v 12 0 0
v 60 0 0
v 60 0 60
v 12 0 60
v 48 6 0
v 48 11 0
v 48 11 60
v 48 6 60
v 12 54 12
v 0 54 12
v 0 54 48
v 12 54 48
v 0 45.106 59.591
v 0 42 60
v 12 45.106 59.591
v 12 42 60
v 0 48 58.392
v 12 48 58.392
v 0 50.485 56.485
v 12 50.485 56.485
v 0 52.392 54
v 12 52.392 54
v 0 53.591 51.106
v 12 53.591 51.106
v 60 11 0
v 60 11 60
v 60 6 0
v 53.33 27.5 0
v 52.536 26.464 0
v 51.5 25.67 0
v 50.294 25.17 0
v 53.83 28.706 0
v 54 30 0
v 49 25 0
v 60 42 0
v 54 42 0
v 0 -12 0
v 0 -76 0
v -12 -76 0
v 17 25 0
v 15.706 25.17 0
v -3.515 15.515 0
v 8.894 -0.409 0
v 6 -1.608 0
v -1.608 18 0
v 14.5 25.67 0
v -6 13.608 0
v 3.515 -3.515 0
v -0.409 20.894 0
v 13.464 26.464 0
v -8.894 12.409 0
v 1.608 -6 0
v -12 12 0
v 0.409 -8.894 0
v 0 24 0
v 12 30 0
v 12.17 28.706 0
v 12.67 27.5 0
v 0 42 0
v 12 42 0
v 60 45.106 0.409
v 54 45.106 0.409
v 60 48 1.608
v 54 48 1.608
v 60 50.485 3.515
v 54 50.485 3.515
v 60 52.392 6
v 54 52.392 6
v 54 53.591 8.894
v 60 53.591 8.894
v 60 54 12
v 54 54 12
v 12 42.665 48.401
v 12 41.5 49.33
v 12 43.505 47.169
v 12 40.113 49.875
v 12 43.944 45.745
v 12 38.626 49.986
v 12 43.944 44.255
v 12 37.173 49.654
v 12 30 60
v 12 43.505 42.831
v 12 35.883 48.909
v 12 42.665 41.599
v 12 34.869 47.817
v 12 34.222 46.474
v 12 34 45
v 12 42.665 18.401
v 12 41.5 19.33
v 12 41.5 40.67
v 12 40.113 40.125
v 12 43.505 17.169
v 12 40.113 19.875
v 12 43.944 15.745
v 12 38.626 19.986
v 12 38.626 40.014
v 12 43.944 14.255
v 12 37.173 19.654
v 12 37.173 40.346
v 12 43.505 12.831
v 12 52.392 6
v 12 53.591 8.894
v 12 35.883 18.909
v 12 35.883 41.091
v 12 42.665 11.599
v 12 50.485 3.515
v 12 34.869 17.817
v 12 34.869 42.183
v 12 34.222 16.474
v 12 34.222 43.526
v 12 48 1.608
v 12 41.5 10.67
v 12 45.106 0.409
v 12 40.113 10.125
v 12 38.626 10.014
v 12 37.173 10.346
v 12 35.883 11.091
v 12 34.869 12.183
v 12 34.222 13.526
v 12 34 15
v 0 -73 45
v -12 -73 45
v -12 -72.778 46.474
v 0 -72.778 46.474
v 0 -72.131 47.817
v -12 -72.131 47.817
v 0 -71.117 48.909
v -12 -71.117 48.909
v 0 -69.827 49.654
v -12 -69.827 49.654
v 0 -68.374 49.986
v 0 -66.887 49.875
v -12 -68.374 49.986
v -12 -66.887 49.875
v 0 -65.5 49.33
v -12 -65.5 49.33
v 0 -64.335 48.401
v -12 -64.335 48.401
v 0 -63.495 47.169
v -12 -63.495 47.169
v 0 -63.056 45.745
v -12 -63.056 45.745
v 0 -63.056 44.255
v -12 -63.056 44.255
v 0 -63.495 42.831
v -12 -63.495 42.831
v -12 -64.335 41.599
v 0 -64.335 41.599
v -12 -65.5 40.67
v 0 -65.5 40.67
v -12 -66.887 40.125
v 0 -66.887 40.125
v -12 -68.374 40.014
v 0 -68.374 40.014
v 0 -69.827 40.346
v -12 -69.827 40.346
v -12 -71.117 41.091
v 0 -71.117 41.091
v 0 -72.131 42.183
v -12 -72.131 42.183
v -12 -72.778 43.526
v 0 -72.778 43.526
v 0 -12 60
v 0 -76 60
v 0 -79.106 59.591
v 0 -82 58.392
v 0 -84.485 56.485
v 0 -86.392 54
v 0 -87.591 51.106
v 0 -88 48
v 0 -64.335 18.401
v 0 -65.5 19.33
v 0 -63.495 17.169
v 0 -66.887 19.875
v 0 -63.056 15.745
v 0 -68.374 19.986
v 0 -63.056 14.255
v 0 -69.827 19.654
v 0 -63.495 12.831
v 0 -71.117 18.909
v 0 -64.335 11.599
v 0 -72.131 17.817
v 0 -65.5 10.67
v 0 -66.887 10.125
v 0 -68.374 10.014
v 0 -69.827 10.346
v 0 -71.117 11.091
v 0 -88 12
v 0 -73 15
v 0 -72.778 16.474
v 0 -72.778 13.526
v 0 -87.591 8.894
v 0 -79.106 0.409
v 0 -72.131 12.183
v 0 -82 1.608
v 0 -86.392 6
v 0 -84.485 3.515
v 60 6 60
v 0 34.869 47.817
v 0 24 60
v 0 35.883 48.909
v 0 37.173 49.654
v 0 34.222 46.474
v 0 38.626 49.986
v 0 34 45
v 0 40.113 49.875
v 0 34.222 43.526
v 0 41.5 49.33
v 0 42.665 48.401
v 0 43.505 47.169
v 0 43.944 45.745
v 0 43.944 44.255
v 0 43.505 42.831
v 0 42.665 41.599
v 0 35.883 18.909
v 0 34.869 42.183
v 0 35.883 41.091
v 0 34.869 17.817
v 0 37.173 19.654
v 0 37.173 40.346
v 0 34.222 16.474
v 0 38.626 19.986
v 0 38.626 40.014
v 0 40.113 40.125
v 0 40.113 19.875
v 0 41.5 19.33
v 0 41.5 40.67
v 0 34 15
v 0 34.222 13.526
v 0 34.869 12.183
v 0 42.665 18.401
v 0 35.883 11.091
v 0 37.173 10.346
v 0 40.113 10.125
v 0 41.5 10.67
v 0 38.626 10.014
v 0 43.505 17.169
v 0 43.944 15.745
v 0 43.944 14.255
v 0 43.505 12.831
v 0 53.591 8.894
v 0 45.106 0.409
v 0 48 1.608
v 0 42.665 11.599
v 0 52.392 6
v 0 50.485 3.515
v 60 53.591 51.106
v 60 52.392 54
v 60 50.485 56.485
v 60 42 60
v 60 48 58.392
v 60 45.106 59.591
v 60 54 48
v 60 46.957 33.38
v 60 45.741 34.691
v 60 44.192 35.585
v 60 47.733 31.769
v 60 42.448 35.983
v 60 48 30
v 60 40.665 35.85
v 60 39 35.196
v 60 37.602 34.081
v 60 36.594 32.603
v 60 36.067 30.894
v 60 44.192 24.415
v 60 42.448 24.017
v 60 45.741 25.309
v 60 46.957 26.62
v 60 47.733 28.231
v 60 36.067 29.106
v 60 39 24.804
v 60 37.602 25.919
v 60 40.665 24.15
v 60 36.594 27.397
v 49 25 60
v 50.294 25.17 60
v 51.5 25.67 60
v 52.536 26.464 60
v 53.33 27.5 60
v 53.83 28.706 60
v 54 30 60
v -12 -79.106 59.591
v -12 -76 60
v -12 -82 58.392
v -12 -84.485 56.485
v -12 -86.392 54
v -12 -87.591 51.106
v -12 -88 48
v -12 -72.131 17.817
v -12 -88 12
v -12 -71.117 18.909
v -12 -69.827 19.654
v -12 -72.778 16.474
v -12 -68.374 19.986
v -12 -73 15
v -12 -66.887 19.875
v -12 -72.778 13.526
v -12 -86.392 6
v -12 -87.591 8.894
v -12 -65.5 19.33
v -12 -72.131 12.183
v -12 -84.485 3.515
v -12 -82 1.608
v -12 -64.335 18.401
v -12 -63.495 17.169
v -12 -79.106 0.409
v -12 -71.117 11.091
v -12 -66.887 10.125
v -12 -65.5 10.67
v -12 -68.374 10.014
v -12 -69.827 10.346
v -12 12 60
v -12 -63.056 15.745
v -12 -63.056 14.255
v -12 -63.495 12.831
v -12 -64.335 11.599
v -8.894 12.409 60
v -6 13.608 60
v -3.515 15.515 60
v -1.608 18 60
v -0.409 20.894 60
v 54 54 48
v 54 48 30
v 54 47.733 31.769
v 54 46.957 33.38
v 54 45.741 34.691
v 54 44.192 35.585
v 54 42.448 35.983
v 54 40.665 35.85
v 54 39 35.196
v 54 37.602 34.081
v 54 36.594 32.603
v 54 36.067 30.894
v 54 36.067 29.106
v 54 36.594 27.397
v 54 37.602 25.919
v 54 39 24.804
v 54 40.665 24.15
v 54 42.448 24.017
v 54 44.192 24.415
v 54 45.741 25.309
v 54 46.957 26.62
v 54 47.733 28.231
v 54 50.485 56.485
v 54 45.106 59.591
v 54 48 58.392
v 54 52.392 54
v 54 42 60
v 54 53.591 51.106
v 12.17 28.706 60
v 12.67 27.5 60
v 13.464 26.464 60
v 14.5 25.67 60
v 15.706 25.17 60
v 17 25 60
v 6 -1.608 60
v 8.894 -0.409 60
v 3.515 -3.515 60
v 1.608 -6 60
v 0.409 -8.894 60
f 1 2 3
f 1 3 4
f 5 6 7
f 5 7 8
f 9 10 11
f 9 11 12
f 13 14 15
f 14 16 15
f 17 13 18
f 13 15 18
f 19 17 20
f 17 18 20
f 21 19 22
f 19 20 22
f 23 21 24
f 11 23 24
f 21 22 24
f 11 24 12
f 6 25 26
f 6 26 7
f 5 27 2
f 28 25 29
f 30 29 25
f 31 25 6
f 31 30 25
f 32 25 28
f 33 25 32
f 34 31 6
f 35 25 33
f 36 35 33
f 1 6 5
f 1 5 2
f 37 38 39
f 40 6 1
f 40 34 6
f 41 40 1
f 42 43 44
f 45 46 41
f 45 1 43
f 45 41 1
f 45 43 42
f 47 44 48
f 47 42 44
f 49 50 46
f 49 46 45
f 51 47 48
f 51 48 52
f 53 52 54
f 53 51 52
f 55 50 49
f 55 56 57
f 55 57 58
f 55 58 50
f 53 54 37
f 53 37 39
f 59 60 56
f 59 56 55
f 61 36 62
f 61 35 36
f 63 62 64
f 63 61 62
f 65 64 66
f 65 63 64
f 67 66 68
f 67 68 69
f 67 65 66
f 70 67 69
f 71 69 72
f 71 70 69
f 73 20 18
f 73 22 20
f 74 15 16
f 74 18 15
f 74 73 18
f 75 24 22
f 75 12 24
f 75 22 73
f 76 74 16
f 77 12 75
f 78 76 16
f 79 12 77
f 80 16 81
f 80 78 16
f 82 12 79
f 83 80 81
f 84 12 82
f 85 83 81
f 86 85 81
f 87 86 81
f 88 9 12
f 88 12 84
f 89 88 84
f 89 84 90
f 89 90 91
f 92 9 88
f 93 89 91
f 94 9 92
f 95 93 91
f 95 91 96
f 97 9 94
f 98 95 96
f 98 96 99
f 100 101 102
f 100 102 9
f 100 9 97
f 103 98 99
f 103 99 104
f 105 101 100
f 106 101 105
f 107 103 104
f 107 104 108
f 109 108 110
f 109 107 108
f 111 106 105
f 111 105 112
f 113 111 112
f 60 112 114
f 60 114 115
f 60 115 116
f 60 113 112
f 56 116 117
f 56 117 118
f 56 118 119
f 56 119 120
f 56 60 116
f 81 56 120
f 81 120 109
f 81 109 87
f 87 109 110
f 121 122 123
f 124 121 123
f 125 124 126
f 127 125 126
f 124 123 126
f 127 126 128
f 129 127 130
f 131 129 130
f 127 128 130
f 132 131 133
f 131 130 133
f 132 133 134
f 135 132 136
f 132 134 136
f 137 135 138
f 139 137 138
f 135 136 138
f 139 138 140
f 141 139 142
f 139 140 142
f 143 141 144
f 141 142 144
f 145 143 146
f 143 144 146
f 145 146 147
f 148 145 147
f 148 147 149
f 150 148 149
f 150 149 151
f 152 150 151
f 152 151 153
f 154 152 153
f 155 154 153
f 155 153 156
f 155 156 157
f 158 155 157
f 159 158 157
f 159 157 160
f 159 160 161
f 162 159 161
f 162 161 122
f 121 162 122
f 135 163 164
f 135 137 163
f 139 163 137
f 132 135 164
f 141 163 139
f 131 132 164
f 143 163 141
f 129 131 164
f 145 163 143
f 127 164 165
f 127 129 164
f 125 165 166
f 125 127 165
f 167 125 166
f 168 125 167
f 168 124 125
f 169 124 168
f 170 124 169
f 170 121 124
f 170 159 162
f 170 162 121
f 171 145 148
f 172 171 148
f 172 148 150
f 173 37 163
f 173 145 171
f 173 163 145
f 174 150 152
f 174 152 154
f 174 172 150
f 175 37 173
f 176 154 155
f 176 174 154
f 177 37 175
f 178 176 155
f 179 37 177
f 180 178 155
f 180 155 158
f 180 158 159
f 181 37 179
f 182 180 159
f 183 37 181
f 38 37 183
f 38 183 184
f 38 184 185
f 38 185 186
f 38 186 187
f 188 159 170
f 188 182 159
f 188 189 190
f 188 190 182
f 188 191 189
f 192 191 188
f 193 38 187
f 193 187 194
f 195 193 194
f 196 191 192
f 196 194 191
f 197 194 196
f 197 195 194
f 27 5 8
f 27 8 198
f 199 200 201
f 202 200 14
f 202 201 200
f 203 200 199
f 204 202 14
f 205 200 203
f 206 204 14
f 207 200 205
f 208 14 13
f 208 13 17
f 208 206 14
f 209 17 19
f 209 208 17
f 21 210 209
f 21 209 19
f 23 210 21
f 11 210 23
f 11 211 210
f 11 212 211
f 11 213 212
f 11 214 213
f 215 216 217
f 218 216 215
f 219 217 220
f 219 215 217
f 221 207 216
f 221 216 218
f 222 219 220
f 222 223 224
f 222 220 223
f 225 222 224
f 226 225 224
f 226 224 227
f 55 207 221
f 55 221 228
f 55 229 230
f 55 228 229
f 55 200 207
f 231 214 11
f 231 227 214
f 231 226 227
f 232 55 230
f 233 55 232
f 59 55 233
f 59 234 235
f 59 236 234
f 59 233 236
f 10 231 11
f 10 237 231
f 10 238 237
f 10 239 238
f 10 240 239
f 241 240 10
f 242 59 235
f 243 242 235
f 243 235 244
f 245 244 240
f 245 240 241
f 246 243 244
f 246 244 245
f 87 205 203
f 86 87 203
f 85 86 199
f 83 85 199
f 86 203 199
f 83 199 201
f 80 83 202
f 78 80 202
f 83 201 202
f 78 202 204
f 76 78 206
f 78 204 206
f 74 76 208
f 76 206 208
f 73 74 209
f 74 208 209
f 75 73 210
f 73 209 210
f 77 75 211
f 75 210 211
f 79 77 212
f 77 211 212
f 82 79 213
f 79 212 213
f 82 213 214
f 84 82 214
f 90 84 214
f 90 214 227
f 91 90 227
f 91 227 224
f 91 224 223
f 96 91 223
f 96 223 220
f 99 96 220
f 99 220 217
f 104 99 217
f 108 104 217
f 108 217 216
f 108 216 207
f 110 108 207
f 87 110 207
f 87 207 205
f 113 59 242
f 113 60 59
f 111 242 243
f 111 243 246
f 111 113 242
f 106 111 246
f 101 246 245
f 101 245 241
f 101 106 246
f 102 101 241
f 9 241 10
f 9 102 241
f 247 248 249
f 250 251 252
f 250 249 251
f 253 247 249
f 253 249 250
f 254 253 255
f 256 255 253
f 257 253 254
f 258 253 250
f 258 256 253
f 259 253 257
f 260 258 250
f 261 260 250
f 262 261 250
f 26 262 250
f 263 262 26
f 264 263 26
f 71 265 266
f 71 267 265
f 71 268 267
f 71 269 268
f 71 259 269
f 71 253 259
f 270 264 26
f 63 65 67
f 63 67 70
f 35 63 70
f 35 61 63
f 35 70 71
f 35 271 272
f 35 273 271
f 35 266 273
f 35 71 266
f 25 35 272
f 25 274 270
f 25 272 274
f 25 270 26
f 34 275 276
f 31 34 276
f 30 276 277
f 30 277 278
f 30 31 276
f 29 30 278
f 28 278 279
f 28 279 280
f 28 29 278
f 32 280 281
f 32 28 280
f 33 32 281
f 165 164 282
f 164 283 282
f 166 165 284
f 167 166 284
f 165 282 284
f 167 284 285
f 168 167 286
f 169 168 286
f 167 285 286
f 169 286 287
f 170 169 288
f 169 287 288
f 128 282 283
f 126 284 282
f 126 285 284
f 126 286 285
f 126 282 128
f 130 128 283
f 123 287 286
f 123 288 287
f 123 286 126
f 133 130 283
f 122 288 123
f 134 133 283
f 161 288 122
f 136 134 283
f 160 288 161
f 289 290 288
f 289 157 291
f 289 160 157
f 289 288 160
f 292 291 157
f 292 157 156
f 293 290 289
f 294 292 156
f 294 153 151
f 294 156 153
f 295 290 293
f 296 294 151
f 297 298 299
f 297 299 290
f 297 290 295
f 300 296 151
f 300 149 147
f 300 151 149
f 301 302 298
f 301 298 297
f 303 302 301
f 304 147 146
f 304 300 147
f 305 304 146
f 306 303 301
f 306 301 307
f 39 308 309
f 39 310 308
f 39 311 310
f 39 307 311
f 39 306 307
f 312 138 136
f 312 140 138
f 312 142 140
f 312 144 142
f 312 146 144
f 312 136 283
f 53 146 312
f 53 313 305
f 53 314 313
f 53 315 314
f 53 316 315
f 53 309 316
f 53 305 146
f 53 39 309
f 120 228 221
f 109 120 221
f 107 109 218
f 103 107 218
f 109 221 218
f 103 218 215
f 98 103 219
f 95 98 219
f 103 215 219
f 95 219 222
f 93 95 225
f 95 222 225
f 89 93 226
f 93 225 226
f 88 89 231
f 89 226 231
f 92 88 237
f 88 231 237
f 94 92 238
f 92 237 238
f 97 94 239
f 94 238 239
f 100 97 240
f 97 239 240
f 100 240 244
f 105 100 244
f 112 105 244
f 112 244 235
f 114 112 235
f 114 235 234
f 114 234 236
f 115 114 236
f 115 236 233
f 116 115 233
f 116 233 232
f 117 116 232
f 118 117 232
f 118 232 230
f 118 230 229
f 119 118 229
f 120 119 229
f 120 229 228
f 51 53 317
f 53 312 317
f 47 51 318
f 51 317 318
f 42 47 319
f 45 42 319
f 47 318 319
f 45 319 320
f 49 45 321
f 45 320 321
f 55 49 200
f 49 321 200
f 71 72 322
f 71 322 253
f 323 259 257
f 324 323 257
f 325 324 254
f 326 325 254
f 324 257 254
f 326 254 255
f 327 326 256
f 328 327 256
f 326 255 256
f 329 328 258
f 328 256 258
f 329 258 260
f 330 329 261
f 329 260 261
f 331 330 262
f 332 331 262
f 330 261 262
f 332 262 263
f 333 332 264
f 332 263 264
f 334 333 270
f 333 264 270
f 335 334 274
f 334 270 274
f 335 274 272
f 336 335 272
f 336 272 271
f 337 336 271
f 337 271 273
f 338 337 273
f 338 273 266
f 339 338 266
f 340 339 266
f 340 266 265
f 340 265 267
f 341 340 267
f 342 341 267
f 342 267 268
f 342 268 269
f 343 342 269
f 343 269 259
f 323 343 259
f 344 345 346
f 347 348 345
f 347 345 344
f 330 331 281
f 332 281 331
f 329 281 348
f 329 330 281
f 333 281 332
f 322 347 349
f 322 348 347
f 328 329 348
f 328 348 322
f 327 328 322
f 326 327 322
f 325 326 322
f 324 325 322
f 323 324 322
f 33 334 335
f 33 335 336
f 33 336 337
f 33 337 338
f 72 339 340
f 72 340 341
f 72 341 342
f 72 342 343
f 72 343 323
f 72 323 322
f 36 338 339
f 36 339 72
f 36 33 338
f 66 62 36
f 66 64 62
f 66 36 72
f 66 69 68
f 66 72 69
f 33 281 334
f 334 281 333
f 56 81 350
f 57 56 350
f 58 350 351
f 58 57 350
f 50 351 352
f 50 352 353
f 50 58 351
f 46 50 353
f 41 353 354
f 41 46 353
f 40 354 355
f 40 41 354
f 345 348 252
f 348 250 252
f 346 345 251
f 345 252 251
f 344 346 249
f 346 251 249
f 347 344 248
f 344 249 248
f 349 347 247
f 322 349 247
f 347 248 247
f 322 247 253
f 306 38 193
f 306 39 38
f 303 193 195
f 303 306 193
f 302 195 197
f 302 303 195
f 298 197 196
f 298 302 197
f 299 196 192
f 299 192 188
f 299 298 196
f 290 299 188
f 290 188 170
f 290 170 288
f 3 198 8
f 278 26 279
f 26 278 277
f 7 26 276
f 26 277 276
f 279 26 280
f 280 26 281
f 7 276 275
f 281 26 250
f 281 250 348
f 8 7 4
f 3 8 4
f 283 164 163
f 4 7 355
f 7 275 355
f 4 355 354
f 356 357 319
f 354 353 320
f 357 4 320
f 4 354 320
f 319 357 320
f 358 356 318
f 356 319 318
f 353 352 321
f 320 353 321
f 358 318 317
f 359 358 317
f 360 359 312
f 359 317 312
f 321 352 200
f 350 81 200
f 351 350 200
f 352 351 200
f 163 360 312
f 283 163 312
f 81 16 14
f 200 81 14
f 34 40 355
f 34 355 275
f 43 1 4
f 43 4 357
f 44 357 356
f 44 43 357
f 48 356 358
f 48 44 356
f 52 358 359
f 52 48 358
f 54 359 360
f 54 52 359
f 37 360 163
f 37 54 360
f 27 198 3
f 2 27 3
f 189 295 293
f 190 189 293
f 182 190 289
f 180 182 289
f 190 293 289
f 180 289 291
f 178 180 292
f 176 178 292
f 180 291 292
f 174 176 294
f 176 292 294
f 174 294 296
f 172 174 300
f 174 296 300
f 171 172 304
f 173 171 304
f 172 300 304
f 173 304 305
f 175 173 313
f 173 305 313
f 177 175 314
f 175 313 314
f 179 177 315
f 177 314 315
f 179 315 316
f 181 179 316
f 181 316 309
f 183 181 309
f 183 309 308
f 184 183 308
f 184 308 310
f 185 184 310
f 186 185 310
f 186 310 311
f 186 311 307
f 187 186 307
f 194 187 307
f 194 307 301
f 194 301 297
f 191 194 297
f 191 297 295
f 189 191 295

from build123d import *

# Parameters (mm, degrees)
BOSS_EXTRUDE1_DEPTH = 60
FILLET1_R           = 12
FILLET2_R           = 12
CUT_EXTRUDE1_REACH  = 130.561
SKETCH4_R           = 5
CUT_EXTRUDE2_REACH  = 130.561
SKETCH5_R           = 6


with BuildPart() as part:
    # Sketch2 → Boss-Extrude1 (new body)
    with BuildSketch(Plane.XY):
        with BuildLine():
            Line((0, -12), (0, -88))
            Line((0, -88), (-12, -88))
            Line((-12, -88), (-12, 12))
            Line((-12, 12), (0, 12))
            Line((0, 12), (0, 54))
            Line((0, 54), (12, 54))
            Line((12, 54), (12, 30))
            ThreePointArc((12, 30), (13.464466094, 26.464466094), (17, 25))
            Line((17, 25), (49, 25))
            ThreePointArc((49, 25), (52.535533906, 26.464466094), (54, 30))
            Line((54, 30), (54, 54))
            Line((54, 54), (60, 54))
            Line((60, 54), (60, 11))
            Line((60, 11), (48, 11))
            Line((48, 11), (48, 6))
            Line((48, 6), (60, 6))
            Line((60, 6), (60, 0))
            Line((60, 0), (12, 0))
            ThreePointArc((12, 0), (3.514718626, -3.514718626), (0, -12))
        make_face()
    extrude(amount=BOSS_EXTRUDE1_DEPTH)

    # Fillet1
    fillet1_edges = [part.edges().sort_by_distance(p)[0] for p in [
        (0, 12, 30),
    ]]
    fillet(fillet1_edges, radius=FILLET1_R - 0.0001)  # a hair under: the kernel refuses the full size

    # Fillet2
    fillet2_edges = [part.edges().sort_by_distance(p)[0] for p in [
        (6, 54, 0),
        (57, 54, 0),
        (-6, -88, 0),
        (57, 54, 60),
        (-6, -88, 60),
        (6, 54, 60),
    ]]
    fillet(fillet2_edges, radius=FILLET2_R)

    # Sketch4 → Cut-Extrude1 (cut, up to next)
    with BuildSketch(Plane.ZY.offset(12), mode=Mode.PRIVATE) as cut_extrude1_sk1:
        with Locations(Location((15, -68, 0), (0, 0, 270))):
            Circle(SKETCH4_R)
    cut_extrude1_tool1 = extrude(cut_extrude1_sk1.sketch, amount=-CUT_EXTRUDE1_REACH, mode=Mode.PRIVATE) & part.part
    # Sketch4 → Cut-Extrude1 (cut, up to next)
    with BuildSketch(Plane.ZY.offset(12), mode=Mode.PRIVATE) as cut_extrude1_sk2:
        with Locations(Location((45, -68, 0), (0, 0, 270))):
            Circle(SKETCH4_R)
    cut_extrude1_tool2 = extrude(cut_extrude1_sk2.sketch, amount=-CUT_EXTRUDE1_REACH, mode=Mode.PRIVATE) & part.part
    # Sketch4 → Cut-Extrude1 (cut, up to next)
    with BuildSketch(Plane.ZY.offset(12), mode=Mode.PRIVATE) as cut_extrude1_sk3:
        with Locations(Location((15, 39, 0), (0, 0, 270))):
            Circle(SKETCH4_R)
    cut_extrude1_tool3 = extrude(cut_extrude1_sk3.sketch, amount=-CUT_EXTRUDE1_REACH, mode=Mode.PRIVATE) & part.part
    # Sketch4 → Cut-Extrude1 (cut, up to next)
    with BuildSketch(Plane.ZY.offset(12), mode=Mode.PRIVATE) as cut_extrude1_sk4:
        with Locations(Location((45, 39, 0), (0, 0, 270))):
            Circle(SKETCH4_R)
    cut_extrude1_tool4 = extrude(cut_extrude1_sk4.sketch, amount=-CUT_EXTRUDE1_REACH, mode=Mode.PRIVATE) & part.part
    add(cut_extrude1_tool1.solids().sort_by_distance((-12, -68, 15))[0], mode=Mode.SUBTRACT)
    add(cut_extrude1_tool2.solids().sort_by_distance((-12, -68, 45))[0], mode=Mode.SUBTRACT)
    add(cut_extrude1_tool3.solids().sort_by_distance((-12, 39, 15))[0], mode=Mode.SUBTRACT)
    add(cut_extrude1_tool4.solids().sort_by_distance((-12, 39, 45))[0], mode=Mode.SUBTRACT)

    # Sketch5 → Cut-Extrude2 (cut, up to next)
    with BuildSketch(Plane(origin=(60, 0, 0), x_dir=(0, 0, -1), z_dir=(1, 0, 0)), mode=Mode.PRIVATE) as cut_extrude2_sk1:
        with Locations(Location((-30, 42, 0), (0, 0, 90))):
            Circle(SKETCH5_R)
    cut_extrude2_tool1 = extrude(cut_extrude2_sk1.sketch, amount=-CUT_EXTRUDE2_REACH, mode=Mode.PRIVATE) & part.part
    add(cut_extrude2_tool1.solids().sort_by_distance((60, 42, 30))[0], mode=Mode.SUBTRACT)


solid = part.part
